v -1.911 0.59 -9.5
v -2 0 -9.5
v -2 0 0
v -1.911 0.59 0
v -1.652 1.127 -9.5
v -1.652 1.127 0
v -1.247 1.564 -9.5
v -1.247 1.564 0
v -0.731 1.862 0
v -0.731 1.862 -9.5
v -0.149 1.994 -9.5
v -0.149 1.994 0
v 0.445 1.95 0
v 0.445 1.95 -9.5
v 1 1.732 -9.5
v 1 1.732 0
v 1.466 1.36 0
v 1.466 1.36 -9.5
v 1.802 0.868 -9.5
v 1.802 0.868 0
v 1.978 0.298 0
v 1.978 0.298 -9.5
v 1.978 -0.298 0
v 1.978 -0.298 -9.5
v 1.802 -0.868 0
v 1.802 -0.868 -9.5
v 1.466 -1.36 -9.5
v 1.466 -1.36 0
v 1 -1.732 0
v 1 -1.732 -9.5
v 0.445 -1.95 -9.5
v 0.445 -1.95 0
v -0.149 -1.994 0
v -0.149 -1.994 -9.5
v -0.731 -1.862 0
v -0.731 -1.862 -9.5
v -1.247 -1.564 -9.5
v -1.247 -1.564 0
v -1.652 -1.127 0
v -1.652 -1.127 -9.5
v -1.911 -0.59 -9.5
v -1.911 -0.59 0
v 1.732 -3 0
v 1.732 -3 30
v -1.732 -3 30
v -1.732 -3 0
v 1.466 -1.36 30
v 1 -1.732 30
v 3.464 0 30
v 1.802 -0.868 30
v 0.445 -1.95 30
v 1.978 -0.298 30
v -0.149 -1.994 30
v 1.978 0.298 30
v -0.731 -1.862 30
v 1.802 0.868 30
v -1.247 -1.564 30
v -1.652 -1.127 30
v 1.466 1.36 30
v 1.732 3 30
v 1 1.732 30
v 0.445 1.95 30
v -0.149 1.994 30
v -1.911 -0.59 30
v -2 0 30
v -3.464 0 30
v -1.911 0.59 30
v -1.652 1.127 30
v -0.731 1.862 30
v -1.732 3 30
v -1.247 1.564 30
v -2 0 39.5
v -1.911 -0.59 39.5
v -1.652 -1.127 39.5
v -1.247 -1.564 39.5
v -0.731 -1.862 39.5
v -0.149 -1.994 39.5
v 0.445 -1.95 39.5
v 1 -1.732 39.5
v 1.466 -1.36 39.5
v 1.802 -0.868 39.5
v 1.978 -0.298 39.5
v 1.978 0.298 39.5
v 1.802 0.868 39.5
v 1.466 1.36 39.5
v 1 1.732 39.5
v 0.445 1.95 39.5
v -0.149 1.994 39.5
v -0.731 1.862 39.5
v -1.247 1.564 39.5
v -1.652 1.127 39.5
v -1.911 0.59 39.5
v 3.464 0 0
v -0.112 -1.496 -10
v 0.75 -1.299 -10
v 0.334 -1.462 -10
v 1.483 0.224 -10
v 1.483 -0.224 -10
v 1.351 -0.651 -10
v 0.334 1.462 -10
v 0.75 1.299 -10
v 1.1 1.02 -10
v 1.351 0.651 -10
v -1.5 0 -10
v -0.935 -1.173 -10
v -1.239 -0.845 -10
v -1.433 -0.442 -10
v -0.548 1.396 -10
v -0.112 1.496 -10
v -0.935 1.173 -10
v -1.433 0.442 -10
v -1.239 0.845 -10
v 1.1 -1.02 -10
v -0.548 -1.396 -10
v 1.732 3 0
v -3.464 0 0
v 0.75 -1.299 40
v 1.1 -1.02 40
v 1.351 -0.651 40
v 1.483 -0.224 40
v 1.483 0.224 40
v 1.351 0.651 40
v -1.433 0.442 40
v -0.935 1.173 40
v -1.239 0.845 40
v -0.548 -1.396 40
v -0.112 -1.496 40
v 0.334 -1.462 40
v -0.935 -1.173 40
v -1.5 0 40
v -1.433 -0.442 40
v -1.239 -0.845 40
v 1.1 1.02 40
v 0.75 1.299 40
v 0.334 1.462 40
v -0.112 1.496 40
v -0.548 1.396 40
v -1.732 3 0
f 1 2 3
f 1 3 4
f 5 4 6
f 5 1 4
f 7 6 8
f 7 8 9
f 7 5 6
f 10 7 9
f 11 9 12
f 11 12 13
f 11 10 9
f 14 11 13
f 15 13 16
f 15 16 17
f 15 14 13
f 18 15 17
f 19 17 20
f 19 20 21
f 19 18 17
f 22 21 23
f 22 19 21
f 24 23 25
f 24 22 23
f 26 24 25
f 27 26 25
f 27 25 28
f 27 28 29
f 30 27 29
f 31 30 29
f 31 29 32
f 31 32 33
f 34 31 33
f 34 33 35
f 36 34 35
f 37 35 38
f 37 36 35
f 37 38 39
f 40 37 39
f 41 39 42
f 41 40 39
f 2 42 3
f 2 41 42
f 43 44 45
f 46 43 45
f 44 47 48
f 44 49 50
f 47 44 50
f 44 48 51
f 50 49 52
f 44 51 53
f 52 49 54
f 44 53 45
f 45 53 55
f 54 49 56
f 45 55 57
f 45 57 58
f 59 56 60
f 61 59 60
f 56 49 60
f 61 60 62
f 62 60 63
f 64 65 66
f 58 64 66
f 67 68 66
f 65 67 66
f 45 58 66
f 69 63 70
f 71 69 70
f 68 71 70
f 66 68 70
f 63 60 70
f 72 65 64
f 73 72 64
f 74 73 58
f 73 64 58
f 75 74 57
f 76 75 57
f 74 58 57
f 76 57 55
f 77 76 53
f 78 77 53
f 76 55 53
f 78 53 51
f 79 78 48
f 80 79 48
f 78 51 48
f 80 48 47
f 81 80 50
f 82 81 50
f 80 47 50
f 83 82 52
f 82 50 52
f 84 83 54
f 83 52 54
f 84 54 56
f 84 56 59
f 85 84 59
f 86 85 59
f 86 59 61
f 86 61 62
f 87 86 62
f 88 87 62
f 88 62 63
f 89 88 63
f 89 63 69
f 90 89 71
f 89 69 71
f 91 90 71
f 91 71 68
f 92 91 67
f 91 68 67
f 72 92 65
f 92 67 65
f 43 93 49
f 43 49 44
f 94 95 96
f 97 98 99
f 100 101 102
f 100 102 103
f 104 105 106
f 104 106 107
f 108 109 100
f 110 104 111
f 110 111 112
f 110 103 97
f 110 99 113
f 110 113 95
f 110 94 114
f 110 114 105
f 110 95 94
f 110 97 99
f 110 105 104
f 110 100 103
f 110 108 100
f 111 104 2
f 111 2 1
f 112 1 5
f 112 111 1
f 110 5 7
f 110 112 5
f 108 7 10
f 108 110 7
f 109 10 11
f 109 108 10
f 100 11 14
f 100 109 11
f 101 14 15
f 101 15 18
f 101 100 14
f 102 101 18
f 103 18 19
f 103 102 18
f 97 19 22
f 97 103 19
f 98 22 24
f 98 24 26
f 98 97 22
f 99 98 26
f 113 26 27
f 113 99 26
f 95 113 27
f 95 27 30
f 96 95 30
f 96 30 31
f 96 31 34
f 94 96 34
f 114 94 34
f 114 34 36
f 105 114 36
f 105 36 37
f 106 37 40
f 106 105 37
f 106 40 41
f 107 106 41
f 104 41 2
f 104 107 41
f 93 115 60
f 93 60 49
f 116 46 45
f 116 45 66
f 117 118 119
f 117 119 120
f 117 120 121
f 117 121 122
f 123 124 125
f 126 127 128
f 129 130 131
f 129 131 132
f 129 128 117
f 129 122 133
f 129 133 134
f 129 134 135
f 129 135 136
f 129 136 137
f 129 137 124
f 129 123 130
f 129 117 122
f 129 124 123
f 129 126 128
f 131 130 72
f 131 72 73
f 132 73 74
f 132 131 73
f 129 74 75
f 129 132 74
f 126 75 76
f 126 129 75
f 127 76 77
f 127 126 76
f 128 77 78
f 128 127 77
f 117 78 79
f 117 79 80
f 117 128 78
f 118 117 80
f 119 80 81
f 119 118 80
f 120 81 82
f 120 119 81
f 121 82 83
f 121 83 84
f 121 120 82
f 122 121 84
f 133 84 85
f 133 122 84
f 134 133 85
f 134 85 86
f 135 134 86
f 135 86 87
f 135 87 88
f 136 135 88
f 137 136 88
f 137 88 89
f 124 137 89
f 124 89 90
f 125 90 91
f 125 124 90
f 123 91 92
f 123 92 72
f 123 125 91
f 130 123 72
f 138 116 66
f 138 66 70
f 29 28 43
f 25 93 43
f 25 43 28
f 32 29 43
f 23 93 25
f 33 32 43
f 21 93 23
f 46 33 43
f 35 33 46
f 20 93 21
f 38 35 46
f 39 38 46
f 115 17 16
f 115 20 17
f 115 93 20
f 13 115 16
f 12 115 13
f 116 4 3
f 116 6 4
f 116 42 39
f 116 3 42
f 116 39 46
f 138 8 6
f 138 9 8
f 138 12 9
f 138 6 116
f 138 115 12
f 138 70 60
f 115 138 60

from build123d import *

# Parameters (mm, degrees)
BOSS_EXTRU_1_DEPTH = 30
ESQUISSE2_R        = 2
BOSS_EXTRU_2_DEPTH = 10
BOSS_EXTRU_3_START = 10
ESQUISSE3_R        = 2
BOSS_EXTRU_3_DEPTH = 10
CHANFREIN1_SIZE    = 0.5


with BuildPart() as part:
    # Esquisse1 → Boss.-Extru.1 (new body)
    with BuildSketch(Plane.XY):
        Polygon((-3.464101615, 0), (-1.732050808, 3), (1.732050808, 3), (3.464101615, 0), (1.732050808, -3), (-1.732050808, -3), align=None)
    extrude(amount=BOSS_EXTRU_1_DEPTH)

    # Esquisse2 → Boss.-Extru.2 (add)
    with BuildSketch(Plane.XY.offset(30)):
        with Locations(Location((0, 0, 0), (0, 0, 180))):
            Circle(ESQUISSE2_R)
    extrude(amount=BOSS_EXTRU_2_DEPTH)

    # Esquisse3 → Boss.-Extru.3 (add)
    with BuildSketch(Plane(origin=(0, 0, 0), x_dir=(-1, 0, 0), z_dir=(0, 0, -1)).offset(BOSS_EXTRU_3_START)):
        Circle(ESQUISSE3_R)
    extrude(amount=-BOSS_EXTRU_3_DEPTH)

    # Chanfrein1
    chanfrein1_edges = [part.edges().sort_by_distance(p)[0] for p in [
        (2, 0, 40),
        (2, 0, -10),
    ]]
    chamfer(chanfrein1_edges, length=CHANFREIN1_SIZE)


solid = part.part
